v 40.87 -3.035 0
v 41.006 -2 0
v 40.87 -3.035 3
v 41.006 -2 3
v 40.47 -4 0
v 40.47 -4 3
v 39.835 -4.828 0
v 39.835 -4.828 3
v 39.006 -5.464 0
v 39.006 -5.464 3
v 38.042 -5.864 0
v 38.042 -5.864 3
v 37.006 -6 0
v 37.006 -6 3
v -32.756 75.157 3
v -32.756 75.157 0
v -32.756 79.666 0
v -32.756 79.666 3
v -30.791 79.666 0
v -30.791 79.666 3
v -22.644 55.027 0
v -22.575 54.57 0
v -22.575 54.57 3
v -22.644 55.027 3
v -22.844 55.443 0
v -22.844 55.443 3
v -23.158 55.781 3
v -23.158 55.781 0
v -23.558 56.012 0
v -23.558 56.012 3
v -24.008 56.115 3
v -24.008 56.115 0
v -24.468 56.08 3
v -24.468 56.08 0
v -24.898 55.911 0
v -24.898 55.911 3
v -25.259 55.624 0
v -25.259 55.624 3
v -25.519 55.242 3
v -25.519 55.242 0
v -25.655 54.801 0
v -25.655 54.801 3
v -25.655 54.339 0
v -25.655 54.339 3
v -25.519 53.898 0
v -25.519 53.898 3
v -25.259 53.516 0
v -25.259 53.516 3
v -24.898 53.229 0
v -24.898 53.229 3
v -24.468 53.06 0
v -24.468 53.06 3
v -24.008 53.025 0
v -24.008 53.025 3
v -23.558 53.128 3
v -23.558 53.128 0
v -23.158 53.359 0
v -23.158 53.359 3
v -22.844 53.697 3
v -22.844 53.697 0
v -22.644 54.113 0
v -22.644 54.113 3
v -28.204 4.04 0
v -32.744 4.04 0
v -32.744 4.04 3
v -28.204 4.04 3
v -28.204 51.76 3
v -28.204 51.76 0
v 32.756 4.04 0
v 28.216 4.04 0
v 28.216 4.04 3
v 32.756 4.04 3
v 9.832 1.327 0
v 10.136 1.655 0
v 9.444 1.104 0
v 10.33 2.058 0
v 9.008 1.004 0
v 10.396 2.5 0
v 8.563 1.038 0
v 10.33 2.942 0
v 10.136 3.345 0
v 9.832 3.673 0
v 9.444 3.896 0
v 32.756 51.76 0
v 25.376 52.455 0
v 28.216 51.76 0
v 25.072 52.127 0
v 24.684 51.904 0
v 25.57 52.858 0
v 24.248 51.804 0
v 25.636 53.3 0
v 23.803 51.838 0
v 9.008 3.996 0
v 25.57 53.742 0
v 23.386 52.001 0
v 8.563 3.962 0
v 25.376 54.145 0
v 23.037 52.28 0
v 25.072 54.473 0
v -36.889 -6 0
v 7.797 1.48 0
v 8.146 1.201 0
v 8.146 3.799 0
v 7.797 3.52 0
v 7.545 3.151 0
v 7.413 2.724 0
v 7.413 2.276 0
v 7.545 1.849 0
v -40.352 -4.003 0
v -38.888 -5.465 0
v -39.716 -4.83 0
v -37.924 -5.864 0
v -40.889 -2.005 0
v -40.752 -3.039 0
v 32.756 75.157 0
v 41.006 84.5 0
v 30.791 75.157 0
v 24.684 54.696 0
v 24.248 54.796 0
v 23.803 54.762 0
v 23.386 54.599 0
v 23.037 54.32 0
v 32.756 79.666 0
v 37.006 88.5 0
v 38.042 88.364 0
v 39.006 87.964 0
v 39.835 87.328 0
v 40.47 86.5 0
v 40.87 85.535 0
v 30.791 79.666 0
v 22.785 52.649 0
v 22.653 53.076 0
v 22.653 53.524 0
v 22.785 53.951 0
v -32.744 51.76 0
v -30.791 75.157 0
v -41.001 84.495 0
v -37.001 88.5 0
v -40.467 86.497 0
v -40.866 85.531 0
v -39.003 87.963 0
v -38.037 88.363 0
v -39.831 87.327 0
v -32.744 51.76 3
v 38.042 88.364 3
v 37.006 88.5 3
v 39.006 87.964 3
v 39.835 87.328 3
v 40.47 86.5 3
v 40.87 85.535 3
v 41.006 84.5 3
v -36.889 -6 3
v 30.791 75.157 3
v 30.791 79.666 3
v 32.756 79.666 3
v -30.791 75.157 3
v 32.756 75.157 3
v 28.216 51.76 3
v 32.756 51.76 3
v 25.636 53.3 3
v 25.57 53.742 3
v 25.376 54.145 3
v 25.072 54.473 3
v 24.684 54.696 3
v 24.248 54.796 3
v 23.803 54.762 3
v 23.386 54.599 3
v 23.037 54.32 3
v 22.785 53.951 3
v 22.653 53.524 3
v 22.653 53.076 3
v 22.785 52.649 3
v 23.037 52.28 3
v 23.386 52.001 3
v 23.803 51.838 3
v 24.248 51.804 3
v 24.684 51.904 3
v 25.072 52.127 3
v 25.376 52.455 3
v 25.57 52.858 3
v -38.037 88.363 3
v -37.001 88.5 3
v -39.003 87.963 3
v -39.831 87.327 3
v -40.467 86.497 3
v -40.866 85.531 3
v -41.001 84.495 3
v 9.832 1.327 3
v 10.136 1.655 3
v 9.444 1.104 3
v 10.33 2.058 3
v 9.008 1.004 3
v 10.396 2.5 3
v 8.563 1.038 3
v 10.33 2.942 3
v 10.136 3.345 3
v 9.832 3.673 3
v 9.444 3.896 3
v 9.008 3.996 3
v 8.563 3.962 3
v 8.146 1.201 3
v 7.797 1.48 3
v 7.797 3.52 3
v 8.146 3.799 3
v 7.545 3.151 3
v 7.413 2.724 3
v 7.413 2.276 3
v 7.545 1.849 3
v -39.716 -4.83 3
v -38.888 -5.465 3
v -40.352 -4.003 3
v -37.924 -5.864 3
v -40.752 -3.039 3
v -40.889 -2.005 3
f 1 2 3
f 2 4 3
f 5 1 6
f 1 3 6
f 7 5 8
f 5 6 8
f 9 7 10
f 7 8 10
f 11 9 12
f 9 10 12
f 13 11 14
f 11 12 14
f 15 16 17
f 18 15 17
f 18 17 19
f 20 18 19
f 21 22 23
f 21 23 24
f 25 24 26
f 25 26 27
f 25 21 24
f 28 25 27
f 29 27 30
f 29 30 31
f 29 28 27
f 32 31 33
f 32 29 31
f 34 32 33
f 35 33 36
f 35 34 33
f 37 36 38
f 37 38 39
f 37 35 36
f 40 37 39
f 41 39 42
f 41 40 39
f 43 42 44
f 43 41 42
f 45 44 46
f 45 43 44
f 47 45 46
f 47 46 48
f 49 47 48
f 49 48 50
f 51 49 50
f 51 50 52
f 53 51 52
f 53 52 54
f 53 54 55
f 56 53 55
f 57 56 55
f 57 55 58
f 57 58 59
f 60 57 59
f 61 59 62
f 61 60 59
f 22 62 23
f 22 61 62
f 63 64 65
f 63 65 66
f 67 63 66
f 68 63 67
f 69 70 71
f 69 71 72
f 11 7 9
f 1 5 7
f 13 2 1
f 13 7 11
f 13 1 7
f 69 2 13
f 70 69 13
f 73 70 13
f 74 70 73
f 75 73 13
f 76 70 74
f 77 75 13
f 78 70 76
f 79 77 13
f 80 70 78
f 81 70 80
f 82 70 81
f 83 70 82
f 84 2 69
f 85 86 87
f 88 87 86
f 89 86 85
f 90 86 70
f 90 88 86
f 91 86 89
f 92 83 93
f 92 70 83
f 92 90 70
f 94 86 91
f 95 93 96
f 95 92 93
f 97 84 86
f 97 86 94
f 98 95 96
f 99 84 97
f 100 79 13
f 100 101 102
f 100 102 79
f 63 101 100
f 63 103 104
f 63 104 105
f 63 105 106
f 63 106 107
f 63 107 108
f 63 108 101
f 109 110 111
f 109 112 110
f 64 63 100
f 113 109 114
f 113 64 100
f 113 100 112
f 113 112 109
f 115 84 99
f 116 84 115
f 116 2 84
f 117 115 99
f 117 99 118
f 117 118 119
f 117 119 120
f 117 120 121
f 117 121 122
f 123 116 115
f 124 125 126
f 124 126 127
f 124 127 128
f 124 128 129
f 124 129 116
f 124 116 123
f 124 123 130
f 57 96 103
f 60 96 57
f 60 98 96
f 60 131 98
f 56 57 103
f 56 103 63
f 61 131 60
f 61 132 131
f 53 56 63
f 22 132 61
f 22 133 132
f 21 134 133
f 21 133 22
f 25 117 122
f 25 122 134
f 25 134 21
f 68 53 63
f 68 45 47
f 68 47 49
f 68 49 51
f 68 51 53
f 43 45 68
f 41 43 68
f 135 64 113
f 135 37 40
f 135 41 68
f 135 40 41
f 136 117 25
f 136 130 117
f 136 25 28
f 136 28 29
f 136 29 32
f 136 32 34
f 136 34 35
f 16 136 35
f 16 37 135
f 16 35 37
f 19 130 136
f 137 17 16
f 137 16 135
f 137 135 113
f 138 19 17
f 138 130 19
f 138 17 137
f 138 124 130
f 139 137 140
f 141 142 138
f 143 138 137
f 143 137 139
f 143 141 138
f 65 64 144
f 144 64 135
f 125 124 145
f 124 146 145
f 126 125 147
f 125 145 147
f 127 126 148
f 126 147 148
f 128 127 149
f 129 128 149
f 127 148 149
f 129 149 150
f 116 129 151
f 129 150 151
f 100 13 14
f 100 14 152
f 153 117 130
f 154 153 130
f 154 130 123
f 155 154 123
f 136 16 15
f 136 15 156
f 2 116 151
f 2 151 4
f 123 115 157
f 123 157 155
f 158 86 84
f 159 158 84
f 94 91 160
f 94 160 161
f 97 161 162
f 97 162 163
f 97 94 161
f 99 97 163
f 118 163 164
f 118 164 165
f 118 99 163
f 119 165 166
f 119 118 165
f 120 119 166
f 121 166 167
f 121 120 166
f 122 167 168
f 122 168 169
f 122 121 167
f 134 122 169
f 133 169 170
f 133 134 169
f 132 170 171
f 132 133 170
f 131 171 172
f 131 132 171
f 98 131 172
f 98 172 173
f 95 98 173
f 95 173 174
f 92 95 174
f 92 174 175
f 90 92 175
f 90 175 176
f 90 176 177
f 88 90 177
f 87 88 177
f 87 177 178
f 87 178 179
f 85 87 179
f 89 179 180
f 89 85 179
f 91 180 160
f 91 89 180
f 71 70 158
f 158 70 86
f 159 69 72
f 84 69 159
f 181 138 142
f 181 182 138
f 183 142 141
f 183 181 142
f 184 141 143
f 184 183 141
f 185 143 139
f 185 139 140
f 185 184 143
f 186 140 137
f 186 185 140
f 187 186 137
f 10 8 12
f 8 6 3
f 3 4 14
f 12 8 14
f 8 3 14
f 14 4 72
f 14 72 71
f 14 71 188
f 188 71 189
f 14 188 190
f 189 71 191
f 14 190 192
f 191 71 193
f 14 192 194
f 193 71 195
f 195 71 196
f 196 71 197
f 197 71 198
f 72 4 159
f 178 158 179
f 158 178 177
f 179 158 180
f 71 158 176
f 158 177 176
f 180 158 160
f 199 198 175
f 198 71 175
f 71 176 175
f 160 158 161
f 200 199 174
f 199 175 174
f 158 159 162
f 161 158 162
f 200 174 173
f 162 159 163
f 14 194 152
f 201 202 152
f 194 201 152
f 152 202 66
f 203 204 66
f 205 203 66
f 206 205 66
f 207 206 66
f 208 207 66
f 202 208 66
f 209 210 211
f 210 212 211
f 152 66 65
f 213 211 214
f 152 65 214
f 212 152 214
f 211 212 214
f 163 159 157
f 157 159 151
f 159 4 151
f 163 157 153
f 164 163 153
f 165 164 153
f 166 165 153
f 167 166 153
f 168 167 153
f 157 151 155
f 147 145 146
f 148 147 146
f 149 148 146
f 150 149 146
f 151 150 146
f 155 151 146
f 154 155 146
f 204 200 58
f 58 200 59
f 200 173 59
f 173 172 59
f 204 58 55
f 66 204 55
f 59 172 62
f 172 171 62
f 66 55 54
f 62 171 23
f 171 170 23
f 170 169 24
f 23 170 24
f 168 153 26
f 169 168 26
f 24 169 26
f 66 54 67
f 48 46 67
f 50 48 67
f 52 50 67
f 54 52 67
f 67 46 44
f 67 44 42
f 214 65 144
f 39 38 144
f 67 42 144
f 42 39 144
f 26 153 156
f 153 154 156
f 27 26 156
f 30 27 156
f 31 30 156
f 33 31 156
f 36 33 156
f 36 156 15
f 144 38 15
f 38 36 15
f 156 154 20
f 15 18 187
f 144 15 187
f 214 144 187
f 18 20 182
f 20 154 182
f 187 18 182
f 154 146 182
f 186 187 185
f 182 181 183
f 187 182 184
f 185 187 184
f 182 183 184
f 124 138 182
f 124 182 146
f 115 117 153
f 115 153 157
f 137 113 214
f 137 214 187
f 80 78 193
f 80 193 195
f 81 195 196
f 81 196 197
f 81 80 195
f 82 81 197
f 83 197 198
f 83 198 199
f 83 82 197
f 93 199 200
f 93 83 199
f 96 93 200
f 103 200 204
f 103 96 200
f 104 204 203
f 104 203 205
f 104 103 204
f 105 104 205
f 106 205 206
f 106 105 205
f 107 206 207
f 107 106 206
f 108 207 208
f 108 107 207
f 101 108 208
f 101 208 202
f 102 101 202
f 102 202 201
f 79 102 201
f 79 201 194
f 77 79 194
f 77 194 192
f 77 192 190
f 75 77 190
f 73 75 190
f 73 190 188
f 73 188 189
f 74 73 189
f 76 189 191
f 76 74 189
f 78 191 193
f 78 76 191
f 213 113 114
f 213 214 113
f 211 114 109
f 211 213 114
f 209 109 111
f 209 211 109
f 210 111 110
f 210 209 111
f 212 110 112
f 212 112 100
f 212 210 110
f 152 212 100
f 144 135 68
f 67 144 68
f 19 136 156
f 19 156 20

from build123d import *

# Parameters (mm, degrees)
ESQUISSE1_R        = 1.5
ESQUISSE1_R_2      = 1.548892625
ESQUISSE1_W        = 4.54
ESQUISSE1_H        = 47.72
ESQUISSE1_W_2      = 1.965612554
ESQUISSE1_H_2      = 4.508607734
BOSS_EXTRU_1_DEPTH = 3
CONG_1_R           = 4


with BuildPart() as part:
    # Esquisse1 → Boss.-Extru.1 (new body)
    with BuildSketch(Plane.XY):
        Polygon((-41.006346513, 88.5), (41.006346513, 88.5), (41.006346513, -6), (-40.884024197, -6), align=None)
        with Locations((8.896346513, 2.5)):
            Circle(ESQUISSE1_R, mode=Mode.SUBTRACT)
        with Locations((-24.123653487, 54.57)):
            Circle(ESQUISSE1_R_2, mode=Mode.SUBTRACT)
        with Locations((24.136346513, 53.3)):
            Circle(ESQUISSE1_R, mode=Mode.SUBTRACT)
        with Locations((-30.473653487, 27.9)):
            Rectangle(ESQUISSE1_W, ESQUISSE1_H, mode=Mode.SUBTRACT)
        with Locations((30.486346513, 27.9)):
            Rectangle(ESQUISSE1_W, ESQUISSE1_H, mode=Mode.SUBTRACT)
        with Locations((31.773540236, 77.411308687)):
            Rectangle(ESQUISSE1_W_2, ESQUISSE1_H_2, mode=Mode.SUBTRACT)
        with Locations((-31.773540236, 77.411308687)):
            Rectangle(ESQUISSE1_W_2, ESQUISSE1_H_2, mode=Mode.SUBTRACT)
    extrude(amount=BOSS_EXTRU_1_DEPTH)

    # Congé1
    cong_1_edges = [part.edges().sort_by_distance(p)[0] for p in [
        (-41.006346513, 88.5, 1.5),
        (41.006346513, 88.5, 1.5),
        (41.006346513, -6, 1.5),
        (-40.884024197, -6, 1.5),
    ]]
    fillet(cong_1_edges, radius=CONG_1_R)


solid = part.part
